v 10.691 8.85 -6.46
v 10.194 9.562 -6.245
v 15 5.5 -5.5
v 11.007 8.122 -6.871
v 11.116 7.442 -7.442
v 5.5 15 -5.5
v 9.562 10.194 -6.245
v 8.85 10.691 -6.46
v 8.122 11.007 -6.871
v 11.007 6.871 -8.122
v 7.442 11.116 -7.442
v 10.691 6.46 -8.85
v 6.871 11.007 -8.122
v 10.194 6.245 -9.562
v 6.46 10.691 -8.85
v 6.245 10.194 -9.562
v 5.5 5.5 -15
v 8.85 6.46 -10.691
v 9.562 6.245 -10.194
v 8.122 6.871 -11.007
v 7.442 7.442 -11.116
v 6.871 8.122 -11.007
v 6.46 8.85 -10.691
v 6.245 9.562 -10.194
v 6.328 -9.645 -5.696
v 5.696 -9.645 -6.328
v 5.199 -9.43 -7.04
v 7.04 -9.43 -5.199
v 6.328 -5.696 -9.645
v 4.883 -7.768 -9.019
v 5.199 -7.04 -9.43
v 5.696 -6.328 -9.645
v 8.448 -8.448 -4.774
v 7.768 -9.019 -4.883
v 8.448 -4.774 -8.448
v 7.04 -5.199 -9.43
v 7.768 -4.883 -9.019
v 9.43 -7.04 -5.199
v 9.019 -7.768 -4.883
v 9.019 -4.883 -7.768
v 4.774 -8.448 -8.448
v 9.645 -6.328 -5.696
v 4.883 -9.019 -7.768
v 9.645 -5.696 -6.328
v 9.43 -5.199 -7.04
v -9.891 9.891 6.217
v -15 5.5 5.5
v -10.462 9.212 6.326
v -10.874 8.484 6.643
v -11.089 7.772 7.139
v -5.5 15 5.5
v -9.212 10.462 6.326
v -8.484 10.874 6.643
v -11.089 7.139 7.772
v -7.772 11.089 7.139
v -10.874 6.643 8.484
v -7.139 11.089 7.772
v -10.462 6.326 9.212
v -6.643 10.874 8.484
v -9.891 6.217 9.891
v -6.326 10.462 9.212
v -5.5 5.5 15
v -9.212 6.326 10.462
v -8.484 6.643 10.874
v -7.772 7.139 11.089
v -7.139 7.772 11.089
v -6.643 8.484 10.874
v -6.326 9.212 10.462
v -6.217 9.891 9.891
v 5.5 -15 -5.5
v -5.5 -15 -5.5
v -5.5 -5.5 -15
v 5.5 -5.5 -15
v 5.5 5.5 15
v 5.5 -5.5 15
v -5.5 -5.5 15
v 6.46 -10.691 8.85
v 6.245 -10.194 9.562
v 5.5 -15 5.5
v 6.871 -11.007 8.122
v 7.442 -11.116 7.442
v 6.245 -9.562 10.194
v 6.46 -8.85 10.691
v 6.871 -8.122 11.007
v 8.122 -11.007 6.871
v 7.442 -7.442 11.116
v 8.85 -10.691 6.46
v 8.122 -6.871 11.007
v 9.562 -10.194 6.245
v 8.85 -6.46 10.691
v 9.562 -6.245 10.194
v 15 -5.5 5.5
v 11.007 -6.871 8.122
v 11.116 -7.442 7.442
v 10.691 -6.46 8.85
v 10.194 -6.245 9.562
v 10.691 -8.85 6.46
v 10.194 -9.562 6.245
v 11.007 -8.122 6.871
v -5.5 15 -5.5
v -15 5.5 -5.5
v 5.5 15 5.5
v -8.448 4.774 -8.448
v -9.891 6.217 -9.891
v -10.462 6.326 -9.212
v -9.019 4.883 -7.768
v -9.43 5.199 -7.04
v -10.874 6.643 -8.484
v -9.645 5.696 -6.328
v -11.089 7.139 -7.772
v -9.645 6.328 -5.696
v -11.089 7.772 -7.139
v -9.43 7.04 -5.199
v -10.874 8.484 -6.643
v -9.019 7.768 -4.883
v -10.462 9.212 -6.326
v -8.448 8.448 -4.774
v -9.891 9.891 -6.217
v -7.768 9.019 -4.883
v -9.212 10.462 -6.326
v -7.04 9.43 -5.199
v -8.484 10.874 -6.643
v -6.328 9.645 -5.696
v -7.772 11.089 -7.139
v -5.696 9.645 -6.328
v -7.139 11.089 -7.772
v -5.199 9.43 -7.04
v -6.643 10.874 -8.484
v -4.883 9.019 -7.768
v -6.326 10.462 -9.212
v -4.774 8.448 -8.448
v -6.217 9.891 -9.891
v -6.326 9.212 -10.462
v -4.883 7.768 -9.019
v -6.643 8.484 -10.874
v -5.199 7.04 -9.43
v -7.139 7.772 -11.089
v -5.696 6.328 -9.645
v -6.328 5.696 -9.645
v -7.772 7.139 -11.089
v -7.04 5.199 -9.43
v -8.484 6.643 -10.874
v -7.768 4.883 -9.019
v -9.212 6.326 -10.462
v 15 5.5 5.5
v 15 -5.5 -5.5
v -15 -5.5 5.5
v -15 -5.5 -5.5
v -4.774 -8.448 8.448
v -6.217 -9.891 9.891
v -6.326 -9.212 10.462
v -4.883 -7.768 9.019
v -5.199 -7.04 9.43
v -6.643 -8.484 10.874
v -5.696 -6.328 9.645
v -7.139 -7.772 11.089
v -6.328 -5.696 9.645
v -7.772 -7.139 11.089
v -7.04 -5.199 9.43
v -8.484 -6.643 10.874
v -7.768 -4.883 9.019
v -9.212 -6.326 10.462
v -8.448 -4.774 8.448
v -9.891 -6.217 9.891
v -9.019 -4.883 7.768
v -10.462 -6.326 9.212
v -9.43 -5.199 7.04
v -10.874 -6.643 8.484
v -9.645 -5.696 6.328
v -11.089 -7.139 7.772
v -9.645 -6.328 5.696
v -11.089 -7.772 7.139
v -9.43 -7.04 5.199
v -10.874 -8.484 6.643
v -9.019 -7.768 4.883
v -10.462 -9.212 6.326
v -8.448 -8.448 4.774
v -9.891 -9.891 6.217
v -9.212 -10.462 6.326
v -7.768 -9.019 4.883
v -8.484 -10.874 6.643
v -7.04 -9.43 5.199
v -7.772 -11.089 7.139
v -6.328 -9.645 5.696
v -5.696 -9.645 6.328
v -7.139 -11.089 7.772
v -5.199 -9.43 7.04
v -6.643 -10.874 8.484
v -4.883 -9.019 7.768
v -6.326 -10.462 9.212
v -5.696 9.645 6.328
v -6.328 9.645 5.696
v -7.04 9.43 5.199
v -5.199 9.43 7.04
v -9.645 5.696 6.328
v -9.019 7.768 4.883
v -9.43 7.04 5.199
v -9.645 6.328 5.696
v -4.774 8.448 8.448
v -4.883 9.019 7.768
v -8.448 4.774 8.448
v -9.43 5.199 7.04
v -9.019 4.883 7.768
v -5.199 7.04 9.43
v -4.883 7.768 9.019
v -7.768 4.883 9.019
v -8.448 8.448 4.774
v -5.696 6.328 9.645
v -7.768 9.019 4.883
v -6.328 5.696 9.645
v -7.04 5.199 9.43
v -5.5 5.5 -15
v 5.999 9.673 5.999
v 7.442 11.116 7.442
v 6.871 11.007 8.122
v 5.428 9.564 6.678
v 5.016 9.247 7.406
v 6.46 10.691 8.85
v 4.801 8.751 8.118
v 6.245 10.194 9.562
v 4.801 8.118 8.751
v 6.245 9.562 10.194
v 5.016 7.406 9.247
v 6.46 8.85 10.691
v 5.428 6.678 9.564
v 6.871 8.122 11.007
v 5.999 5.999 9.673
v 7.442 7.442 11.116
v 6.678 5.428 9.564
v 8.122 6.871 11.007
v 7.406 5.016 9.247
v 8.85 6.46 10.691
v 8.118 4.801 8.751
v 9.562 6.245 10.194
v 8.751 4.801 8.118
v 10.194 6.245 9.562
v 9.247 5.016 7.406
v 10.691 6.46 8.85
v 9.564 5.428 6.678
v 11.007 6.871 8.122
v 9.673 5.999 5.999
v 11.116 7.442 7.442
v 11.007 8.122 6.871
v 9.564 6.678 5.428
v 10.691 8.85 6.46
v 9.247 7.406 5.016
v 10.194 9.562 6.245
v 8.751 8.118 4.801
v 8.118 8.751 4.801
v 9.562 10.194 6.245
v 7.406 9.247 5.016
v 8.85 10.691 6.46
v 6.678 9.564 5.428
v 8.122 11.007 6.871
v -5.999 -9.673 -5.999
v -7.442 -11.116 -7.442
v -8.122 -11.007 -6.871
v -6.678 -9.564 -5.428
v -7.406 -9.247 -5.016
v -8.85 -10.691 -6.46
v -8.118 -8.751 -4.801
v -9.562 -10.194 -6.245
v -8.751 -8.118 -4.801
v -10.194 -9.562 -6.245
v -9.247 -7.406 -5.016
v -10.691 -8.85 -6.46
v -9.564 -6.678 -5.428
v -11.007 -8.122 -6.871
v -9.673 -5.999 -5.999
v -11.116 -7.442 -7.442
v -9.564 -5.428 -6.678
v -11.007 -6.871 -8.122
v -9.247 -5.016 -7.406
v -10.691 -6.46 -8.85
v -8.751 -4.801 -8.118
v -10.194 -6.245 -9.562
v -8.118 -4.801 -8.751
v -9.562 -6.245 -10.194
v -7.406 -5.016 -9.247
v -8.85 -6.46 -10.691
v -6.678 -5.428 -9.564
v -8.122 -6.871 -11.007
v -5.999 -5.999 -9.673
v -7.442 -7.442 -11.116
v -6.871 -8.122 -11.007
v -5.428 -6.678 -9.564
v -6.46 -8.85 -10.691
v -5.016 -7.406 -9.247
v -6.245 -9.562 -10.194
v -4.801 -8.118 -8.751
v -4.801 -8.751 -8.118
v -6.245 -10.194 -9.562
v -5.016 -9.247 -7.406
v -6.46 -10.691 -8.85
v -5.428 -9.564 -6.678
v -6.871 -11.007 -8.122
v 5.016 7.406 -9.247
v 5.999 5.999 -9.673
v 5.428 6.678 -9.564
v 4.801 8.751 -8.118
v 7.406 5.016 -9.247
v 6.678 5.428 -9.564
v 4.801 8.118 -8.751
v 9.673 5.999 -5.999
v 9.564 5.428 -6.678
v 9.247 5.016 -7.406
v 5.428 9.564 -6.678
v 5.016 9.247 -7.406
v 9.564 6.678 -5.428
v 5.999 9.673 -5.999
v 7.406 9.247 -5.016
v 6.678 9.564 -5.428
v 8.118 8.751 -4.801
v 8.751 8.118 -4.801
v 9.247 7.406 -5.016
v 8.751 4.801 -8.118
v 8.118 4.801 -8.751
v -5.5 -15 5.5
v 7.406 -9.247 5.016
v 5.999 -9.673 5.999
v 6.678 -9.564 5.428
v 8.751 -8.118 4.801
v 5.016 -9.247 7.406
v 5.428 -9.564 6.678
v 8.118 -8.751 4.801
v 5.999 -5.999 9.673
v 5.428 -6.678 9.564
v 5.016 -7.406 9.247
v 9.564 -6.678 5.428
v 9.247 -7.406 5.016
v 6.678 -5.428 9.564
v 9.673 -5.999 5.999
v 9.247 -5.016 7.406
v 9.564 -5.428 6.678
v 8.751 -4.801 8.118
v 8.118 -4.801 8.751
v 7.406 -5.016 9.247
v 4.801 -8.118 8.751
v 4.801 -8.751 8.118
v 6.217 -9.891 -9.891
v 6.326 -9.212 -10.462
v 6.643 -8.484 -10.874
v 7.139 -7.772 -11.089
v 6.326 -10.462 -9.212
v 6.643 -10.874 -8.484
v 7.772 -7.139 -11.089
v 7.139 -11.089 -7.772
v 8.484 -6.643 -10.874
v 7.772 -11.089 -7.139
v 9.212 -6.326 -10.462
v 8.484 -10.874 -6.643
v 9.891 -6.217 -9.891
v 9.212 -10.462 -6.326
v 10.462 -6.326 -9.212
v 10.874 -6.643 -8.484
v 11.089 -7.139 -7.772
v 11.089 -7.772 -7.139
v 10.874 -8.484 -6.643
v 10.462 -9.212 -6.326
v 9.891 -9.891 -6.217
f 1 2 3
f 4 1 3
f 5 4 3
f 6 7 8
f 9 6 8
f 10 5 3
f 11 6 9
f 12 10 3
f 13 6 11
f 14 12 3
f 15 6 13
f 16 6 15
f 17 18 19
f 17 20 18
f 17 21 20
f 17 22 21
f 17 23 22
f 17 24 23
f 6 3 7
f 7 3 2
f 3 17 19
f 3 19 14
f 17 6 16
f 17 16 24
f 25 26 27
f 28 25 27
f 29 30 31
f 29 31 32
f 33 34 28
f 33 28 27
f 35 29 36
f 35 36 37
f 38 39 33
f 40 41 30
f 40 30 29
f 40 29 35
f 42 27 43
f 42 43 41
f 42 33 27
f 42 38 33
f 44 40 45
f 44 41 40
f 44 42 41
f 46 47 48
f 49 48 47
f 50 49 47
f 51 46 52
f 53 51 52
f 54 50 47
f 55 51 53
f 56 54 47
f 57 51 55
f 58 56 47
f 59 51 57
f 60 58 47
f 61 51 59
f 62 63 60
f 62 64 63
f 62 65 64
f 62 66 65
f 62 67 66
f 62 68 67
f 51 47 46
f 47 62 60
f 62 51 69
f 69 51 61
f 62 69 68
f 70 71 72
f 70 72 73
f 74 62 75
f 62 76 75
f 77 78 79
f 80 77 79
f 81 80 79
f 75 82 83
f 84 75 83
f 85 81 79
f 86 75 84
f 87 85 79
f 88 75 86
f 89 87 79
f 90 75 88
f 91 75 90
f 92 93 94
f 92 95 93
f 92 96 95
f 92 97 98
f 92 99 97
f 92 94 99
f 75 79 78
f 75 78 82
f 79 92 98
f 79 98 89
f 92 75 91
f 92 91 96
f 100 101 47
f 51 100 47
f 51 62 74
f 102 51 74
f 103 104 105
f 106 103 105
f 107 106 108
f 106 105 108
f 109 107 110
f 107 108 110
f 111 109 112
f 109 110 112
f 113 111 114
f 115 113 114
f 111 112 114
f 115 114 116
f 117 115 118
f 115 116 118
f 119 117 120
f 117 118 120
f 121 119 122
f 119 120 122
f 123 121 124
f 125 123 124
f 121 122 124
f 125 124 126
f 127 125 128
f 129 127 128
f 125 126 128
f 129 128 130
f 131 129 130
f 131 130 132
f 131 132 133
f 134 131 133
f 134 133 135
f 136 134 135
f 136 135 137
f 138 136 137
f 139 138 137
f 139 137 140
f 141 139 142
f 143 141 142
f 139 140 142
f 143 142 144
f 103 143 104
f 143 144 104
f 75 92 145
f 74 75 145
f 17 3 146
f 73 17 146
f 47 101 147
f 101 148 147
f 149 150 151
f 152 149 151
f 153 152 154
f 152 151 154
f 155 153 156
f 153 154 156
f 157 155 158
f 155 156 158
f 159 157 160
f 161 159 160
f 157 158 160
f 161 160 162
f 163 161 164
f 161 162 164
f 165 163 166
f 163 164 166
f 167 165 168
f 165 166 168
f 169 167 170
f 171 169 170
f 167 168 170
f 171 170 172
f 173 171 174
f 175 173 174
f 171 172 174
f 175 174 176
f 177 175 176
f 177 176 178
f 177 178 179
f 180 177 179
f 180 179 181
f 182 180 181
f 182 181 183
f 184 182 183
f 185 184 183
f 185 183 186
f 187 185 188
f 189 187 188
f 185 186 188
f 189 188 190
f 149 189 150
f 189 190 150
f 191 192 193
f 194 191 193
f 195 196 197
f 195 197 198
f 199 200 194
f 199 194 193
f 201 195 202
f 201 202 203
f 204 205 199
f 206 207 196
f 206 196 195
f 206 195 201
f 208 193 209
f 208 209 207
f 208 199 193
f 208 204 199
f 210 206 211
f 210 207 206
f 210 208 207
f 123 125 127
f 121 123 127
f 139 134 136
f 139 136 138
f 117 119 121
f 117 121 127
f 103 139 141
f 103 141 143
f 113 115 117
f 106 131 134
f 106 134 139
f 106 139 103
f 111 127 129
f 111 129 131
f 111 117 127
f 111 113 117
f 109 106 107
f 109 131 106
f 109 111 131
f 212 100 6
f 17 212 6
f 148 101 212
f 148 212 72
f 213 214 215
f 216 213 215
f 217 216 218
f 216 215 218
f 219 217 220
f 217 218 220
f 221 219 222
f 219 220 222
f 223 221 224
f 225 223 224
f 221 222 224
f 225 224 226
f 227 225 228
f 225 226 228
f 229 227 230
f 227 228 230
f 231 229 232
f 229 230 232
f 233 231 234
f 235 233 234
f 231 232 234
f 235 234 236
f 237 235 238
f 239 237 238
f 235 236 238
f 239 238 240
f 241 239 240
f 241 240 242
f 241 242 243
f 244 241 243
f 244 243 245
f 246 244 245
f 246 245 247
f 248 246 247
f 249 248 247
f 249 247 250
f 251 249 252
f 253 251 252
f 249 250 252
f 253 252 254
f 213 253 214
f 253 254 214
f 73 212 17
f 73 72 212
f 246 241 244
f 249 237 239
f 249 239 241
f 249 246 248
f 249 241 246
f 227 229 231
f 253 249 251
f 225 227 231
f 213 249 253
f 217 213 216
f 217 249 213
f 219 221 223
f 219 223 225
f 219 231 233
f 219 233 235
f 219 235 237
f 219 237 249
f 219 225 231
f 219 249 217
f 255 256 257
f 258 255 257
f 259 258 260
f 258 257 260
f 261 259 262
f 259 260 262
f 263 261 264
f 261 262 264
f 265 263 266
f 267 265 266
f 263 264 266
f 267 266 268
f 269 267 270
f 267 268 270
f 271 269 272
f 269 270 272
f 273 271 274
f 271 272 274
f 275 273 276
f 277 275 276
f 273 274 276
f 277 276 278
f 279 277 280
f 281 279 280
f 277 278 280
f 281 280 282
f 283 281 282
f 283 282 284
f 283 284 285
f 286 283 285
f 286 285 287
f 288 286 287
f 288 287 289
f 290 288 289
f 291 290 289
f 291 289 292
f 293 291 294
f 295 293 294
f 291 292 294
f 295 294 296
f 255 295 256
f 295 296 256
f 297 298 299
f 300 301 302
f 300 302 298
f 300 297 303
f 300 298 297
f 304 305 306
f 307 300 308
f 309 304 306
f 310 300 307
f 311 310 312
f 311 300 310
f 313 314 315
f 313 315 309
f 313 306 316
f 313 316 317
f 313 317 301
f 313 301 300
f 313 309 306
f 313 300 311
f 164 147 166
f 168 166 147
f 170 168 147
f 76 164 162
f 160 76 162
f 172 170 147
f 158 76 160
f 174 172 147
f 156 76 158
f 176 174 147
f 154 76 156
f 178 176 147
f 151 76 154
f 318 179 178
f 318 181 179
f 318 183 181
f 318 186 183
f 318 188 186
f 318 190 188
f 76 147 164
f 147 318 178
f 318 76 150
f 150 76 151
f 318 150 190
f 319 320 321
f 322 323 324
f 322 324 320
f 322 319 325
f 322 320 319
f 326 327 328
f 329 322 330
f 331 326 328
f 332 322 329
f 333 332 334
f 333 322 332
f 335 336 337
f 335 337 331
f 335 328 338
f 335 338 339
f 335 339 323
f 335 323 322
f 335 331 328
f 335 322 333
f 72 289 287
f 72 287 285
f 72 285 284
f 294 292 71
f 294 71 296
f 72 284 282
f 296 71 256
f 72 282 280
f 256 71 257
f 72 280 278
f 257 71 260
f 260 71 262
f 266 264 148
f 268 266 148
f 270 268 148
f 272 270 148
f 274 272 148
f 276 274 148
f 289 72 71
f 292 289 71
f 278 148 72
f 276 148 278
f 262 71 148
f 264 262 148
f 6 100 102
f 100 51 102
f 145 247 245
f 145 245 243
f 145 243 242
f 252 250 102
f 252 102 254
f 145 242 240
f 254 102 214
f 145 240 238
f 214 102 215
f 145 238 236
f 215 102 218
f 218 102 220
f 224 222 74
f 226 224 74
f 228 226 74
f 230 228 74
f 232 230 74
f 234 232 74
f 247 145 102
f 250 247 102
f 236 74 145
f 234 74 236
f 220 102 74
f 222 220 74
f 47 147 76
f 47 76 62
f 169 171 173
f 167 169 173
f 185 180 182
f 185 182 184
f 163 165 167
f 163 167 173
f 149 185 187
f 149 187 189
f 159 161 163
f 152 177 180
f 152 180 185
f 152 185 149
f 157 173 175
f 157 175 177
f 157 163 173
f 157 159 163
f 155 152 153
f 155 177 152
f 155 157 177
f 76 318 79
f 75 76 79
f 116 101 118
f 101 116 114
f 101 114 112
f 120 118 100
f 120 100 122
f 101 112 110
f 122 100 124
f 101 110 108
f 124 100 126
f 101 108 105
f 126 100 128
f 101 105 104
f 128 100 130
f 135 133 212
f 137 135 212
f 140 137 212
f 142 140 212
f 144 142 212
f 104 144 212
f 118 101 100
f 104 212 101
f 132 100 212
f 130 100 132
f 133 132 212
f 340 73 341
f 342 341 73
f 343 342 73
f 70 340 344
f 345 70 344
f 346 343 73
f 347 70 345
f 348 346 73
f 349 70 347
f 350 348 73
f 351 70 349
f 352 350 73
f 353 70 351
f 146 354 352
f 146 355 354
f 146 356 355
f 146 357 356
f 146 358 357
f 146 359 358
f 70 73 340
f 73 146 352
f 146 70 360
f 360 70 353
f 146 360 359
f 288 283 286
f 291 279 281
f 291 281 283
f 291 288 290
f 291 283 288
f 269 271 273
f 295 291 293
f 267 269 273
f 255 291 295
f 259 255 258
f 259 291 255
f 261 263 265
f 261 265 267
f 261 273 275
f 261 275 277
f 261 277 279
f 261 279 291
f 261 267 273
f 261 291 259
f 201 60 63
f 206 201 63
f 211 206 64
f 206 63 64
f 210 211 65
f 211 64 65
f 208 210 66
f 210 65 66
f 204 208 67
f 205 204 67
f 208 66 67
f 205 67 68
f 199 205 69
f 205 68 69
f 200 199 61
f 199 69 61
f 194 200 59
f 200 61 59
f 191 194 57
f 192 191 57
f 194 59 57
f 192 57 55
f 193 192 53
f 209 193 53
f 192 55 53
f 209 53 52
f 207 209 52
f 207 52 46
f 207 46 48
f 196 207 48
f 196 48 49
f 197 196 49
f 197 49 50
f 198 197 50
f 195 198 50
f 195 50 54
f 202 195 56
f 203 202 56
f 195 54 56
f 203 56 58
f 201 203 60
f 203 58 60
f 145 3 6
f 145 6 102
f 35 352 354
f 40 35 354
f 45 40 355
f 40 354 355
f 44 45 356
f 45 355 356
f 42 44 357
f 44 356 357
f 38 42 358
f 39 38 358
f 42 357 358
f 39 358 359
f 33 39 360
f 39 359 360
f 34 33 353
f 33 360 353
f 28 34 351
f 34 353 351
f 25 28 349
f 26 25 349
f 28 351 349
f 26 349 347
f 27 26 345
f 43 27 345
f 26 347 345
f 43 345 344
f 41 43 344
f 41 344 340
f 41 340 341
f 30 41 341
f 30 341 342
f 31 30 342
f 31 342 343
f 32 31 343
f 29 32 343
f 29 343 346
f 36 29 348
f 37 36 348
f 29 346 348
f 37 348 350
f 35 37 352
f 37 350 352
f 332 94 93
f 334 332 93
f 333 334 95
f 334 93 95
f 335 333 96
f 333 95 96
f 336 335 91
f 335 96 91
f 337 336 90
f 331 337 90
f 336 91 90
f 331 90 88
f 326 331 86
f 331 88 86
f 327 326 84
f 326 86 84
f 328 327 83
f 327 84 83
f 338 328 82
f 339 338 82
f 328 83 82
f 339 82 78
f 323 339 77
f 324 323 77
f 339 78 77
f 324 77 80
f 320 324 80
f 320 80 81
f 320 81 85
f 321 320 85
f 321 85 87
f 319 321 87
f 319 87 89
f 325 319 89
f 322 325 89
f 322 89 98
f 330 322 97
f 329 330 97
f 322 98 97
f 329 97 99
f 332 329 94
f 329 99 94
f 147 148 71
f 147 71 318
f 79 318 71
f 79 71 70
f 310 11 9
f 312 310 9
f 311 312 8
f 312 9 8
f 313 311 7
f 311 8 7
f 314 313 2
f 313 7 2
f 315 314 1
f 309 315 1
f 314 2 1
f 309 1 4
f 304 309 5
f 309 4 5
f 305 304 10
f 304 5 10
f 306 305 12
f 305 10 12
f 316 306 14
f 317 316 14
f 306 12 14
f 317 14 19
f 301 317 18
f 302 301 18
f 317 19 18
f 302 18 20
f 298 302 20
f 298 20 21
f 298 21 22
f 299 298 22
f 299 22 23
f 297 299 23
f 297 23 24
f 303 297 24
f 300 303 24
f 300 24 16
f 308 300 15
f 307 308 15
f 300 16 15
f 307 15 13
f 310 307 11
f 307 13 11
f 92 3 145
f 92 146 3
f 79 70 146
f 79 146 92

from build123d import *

# Parameters (mm, degrees)
F0_W      = 30
F0_H      = 30
F1_DEPTH  = 15
F2_SIZE   = 9.5
F3_R      = 3
F4_DEPTH  = 2.5
F5_R      = 3
F6_DEPTH  = 2.5
F7_R      = 3
F8_DEPTH  = 2.5
F9_R      = 3
F10_DEPTH = 2.5
F11_R     = 3
F12_DEPTH = 2.5
F13_R     = 3
F14_DEPTH = 2.5
F15_R     = 3
F16_DEPTH = 2.5
F17_R     = 3
F18_DEPTH = 2.5


with BuildPart() as f1:
    # F0 (on Front) → F1 (new body, symmetric)
    with BuildSketch(Plane.XZ):
        Rectangle(F0_W, F0_H)
    extrude(amount=F1_DEPTH, both=True)

    # F2
    f2_edges = [f1.edges().sort_by_distance(p)[0] for p in [
        (0, 15, -15),
        (0, 15, 15),
        (15, 15, 0),
        (-15, 15, 0),
        (15, 0, 15),
        (0, -15, 15),
        (-15, 0, 15),
        (-15, -15, 0),
        (15, -15, 0),
        (0, -15, -15),
        (-15, 0, -15),
        (15, 0, -15),
    ]]
    chamfer(f2_edges, length=F2_SIZE)

    # F3 (on face) → F4 (cut)
    with BuildSketch(Plane(origin=(-8.666667, 8.666667, 8.666667), x_dir=(-0.408248, -0.816497, 0.408248), z_dir=(-0.57735, 0.57735, 0.57735))):
        Circle(F3_R)
    extrude(amount=-F4_DEPTH, mode=Mode.SUBTRACT)

    # F5 (on face) → F6 (cut)
    with BuildSketch(Plane(origin=(8.666667, 8.666667, -8.666667), x_dir=(-0.408248, 0.816497, 0.408248), z_dir=(0.57735, 0.57735, -0.57735))):
        Circle(F5_R)
    extrude(amount=-F6_DEPTH, mode=Mode.SUBTRACT)

    # F7 (on face) → F8 (cut)
    with BuildSketch(Plane(origin=(-8.666667, 8.666667, -8.666667), x_dir=(-0.408248, -0.816497, -0.408248), z_dir=(-0.57735, 0.57735, -0.57735))):
        Circle(F7_R)
    extrude(amount=-F8_DEPTH, mode=Mode.SUBTRACT)

    # F9 (on face) → F10 (cut)
    with BuildSketch(Plane(origin=(-8.666667, -8.666667, 8.666667), x_dir=(0.816497, -0.408248, 0.408248), z_dir=(-0.57735, -0.57735, 0.57735))):
        Circle(F9_R)
    extrude(amount=-F10_DEPTH, mode=Mode.SUBTRACT)

    # F11 (on face) → F12 (cut)
    with BuildSketch(Plane(origin=(8.666667, -8.666667, 8.666667), x_dir=(0.816497, 0.408248, -0.408248), z_dir=(0.57735, -0.57735, 0.57735))):
        Circle(F11_R)
    extrude(amount=-F12_DEPTH, mode=Mode.SUBTRACT)

    # F13 (on face) → F14 (cut)
    with BuildSketch(Plane(origin=(-8.666667, -8.666667, -8.666667), x_dir=(0.408248, -0.816497, 0.408248), z_dir=(-0.57735, -0.57735, -0.57735))):
        Circle(F13_R)
    extrude(amount=-F14_DEPTH, mode=Mode.SUBTRACT)

    # F15 (on face) → F16 (cut)
    with BuildSketch(Plane(origin=(8.666667, 8.666667, 8.666667), x_dir=(-0.408248, 0.816497, -0.408248), z_dir=(0.57735, 0.57735, 0.57735))):
        Circle(F15_R)
    extrude(amount=-F16_DEPTH, mode=Mode.SUBTRACT)

    # F17 (on face) → F18 (cut)
    with BuildSketch(Plane(origin=(8.666667, -8.666667, -8.666667), x_dir=(0.408248, 0.816497, -0.408248), z_dir=(0.57735, -0.57735, -0.57735))):
        Circle(F17_R)
    extrude(amount=-F18_DEPTH, mode=Mode.SUBTRACT)


solid = f1.part
